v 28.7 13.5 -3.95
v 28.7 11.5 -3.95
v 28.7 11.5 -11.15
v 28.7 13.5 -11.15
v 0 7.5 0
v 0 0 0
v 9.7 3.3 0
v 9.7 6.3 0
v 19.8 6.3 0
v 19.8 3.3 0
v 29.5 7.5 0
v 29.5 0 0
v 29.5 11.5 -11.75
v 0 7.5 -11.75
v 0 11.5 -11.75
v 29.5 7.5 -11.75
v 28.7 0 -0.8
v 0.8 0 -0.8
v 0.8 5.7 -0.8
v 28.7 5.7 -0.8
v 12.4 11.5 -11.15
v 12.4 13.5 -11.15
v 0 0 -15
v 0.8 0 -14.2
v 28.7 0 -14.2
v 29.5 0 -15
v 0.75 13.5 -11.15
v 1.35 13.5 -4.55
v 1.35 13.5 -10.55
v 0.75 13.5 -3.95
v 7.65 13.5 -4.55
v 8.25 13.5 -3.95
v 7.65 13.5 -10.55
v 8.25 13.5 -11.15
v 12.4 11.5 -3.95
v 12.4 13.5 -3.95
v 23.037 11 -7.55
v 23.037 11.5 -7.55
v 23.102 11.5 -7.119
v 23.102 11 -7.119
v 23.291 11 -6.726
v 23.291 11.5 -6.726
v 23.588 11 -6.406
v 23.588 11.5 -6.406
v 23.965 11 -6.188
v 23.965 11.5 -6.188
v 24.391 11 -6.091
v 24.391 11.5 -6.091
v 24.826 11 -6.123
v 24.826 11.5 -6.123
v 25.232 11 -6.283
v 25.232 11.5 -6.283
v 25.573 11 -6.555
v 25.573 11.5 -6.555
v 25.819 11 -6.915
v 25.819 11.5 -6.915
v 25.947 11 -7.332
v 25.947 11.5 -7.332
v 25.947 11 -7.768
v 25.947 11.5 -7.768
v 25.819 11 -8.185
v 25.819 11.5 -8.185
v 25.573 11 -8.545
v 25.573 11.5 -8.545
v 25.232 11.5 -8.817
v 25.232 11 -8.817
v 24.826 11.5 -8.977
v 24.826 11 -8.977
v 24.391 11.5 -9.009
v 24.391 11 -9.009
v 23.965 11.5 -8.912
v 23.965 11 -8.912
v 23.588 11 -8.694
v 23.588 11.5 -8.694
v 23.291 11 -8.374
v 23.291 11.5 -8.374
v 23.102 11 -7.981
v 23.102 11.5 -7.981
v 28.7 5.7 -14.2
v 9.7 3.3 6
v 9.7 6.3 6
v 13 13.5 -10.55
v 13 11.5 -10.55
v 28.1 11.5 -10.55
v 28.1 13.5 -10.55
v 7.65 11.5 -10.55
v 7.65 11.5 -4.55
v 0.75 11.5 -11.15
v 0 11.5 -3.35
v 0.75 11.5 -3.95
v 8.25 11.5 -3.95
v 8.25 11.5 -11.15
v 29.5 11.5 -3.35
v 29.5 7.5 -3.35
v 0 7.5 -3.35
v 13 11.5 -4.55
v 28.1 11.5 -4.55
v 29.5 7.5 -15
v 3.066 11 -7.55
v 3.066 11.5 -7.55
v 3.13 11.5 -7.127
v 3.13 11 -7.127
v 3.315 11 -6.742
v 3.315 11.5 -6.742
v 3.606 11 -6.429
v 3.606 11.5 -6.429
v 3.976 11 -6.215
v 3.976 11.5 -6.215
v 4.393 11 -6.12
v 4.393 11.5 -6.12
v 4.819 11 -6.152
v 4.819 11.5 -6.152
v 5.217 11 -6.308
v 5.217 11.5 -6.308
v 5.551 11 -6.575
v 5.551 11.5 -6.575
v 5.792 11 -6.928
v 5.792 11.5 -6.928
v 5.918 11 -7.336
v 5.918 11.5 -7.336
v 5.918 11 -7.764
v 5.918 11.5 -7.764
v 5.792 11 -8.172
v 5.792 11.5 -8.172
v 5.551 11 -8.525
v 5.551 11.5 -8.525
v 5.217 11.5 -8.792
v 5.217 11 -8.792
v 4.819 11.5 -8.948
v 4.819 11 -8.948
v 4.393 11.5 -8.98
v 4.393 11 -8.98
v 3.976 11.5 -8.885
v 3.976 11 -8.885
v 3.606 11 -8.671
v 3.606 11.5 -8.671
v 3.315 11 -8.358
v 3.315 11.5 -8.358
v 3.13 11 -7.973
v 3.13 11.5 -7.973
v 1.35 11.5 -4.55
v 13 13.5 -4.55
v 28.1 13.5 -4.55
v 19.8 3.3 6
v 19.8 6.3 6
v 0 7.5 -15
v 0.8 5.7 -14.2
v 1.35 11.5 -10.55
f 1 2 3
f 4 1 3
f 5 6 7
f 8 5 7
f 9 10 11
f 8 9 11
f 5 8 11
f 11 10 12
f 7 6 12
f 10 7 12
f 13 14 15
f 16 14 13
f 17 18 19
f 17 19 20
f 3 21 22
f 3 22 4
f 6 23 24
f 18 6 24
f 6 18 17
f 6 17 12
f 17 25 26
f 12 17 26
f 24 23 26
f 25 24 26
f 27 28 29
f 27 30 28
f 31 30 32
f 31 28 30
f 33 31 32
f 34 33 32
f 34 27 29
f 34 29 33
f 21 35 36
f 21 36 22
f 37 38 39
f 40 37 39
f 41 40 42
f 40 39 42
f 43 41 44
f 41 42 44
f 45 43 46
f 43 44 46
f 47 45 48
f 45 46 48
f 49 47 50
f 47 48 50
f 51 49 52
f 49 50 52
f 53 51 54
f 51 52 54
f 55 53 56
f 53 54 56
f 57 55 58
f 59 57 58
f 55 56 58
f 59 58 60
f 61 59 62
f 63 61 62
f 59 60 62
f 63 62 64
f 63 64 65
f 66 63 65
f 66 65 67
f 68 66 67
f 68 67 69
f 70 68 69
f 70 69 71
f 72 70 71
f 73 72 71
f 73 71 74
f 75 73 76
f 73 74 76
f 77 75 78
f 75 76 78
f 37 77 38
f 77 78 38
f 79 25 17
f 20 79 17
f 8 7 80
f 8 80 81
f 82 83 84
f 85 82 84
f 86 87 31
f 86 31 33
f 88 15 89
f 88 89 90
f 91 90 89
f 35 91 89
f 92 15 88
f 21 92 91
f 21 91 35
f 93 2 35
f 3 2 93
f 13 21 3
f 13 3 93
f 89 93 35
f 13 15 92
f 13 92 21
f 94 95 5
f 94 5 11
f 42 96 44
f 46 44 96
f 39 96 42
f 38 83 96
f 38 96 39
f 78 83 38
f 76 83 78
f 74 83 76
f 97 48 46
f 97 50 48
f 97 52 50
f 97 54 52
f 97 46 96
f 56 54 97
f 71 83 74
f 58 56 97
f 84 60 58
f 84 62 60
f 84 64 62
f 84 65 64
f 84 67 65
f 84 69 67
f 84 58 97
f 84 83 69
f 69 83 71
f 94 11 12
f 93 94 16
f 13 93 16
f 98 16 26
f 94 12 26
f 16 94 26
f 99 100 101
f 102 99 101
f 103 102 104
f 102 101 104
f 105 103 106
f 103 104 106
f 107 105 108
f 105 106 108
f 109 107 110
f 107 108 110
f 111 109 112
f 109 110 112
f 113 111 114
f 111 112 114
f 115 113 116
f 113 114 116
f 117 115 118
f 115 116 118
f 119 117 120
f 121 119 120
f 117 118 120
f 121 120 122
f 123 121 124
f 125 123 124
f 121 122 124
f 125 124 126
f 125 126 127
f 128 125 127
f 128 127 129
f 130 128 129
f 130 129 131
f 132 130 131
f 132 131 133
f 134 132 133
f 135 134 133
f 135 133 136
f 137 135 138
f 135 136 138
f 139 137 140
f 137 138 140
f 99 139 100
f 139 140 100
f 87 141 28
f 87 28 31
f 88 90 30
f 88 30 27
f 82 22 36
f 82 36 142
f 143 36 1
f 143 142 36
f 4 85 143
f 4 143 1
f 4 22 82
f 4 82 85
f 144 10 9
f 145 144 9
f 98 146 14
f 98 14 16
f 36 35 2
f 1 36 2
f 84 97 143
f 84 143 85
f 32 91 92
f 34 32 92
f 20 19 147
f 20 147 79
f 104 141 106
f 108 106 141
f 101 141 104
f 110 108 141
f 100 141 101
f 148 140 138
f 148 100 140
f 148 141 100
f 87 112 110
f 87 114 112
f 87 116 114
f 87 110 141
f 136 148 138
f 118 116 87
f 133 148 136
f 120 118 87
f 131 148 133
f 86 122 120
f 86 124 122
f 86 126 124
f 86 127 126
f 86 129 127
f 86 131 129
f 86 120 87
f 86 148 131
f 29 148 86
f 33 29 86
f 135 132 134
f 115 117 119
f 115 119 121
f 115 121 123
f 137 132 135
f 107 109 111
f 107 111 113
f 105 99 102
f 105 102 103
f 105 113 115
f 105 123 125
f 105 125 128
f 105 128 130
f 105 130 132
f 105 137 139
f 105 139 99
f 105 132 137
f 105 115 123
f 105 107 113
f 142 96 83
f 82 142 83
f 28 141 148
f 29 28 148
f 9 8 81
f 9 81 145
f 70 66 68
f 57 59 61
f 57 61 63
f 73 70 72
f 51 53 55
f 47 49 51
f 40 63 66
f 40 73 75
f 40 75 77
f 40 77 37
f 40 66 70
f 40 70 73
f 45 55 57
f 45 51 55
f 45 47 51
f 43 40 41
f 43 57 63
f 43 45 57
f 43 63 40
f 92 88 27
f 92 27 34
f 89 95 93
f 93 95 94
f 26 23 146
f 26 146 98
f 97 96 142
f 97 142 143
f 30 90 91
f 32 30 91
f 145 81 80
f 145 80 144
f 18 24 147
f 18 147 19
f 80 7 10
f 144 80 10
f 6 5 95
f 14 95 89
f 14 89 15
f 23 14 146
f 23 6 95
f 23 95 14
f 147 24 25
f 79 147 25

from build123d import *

# Parameters (mm, degrees)
SKIZZE2_W                       = 29.5
SKIZZE2_H                       = 15
AUFSATZ_LINEAR_AUSTRAGEN1_DEPTH = 7.5
SKIZZE4_W                       = 27.9
SKIZZE4_H                       = 13.4
SCHNITT_LINEAR_AUSTRAGEN1_DEPTH = 5.7
SKIZZE5_W                       = 29.5
SKIZZE5_H                       = 8.4
AUFSATZ_LINEAR_AUSTRAGEN2_DEPTH = 4
SKIZZE7_W                       = 7.5
SKIZZE7_H                       = 7.2
SKIZZE7_W_2                     = 6.3
SKIZZE7_H_2                     = 6
SKIZZE7_W_3                     = 16.3
SKIZZE7_W_4                     = 15.1
AUFSATZ_LINEAR_AUSTRAGEN3_DEPTH = 2
SKIZZE8_R                       = 1.434086585
SKIZZE8_R_2                     = 1.463442441
SCHNITT_LINEAR_AUSTRAGEN2_DEPTH = 0.5
SKIZZE9_W                       = 10.1
SKIZZE9_H                       = 3
AUFSATZ_LINEAR_AUSTRAGEN4_DEPTH = 6


with BuildPart() as part:
    # Skizze2 → Aufsatz-Linear austragen1 (new body)
    with BuildSketch(Plane(origin=(0, 0, 0), x_dir=(1, 0, 0), z_dir=(0, 1, 0))):
        with Locations((14.75, 7.5)):
            Rectangle(SKIZZE2_W, SKIZZE2_H)
    extrude(amount=AUFSATZ_LINEAR_AUSTRAGEN1_DEPTH)

    # Skizze4 → Schnitt-Linear austragen1 (cut)
    with BuildSketch(Plane.XZ):
        with Locations((14.75, -7.5)):
            Rectangle(SKIZZE4_W, SKIZZE4_H)
    extrude(amount=-SCHNITT_LINEAR_AUSTRAGEN1_DEPTH, mode=Mode.SUBTRACT)

    # Skizze5 → Aufsatz-Linear austragen2 (add)
    with BuildSketch(Plane(origin=(0, 7.5, 0), x_dir=(1, 0, 0), z_dir=(0, 1, 0))):
        with Locations((14.75, 7.55)):
            Rectangle(SKIZZE5_W, SKIZZE5_H)
    extrude(amount=AUFSATZ_LINEAR_AUSTRAGEN2_DEPTH)

    # Skizze7 → Aufsatz-Linear austragen3 (add)
    with BuildSketch(Plane(origin=(0, 11.5, 0), x_dir=(1, 0, 0), z_dir=(0, 1, 0))):
        with Locations((4.5, 7.55)):
            Rectangle(SKIZZE7_W, SKIZZE7_H)
        with Locations((4.5, 7.55)):
            Rectangle(SKIZZE7_W_2, SKIZZE7_H_2, mode=Mode.SUBTRACT)
        with Locations((20.55, 7.55)):
            Rectangle(SKIZZE7_W_3, SKIZZE7_H)
        with Locations((20.55, 7.55)):
            Rectangle(SKIZZE7_W_4, SKIZZE7_H_2, mode=Mode.SUBTRACT)
    extrude(amount=AUFSATZ_LINEAR_AUSTRAGEN3_DEPTH)

    # Skizze8 → Schnitt-Linear austragen2 (cut)
    with BuildSketch(Plane(origin=(0, 11.5, 0), x_dir=(-1, 0, 0), z_dir=(0, 1, 0))):
        with Locations((-4.5, -7.55)):
            Circle(SKIZZE8_R)
        with Locations((-24.5, -7.55)):
            Circle(SKIZZE8_R_2)
    extrude(amount=-SCHNITT_LINEAR_AUSTRAGEN2_DEPTH, mode=Mode.SUBTRACT)

    # Skizze9 → Aufsatz-Linear austragen4 (add)
    with BuildSketch(Plane.XY):
        with Locations((14.75, 4.8)):
            Rectangle(SKIZZE9_W, SKIZZE9_H)
    extrude(amount=AUFSATZ_LINEAR_AUSTRAGEN4_DEPTH)


solid = part.part
